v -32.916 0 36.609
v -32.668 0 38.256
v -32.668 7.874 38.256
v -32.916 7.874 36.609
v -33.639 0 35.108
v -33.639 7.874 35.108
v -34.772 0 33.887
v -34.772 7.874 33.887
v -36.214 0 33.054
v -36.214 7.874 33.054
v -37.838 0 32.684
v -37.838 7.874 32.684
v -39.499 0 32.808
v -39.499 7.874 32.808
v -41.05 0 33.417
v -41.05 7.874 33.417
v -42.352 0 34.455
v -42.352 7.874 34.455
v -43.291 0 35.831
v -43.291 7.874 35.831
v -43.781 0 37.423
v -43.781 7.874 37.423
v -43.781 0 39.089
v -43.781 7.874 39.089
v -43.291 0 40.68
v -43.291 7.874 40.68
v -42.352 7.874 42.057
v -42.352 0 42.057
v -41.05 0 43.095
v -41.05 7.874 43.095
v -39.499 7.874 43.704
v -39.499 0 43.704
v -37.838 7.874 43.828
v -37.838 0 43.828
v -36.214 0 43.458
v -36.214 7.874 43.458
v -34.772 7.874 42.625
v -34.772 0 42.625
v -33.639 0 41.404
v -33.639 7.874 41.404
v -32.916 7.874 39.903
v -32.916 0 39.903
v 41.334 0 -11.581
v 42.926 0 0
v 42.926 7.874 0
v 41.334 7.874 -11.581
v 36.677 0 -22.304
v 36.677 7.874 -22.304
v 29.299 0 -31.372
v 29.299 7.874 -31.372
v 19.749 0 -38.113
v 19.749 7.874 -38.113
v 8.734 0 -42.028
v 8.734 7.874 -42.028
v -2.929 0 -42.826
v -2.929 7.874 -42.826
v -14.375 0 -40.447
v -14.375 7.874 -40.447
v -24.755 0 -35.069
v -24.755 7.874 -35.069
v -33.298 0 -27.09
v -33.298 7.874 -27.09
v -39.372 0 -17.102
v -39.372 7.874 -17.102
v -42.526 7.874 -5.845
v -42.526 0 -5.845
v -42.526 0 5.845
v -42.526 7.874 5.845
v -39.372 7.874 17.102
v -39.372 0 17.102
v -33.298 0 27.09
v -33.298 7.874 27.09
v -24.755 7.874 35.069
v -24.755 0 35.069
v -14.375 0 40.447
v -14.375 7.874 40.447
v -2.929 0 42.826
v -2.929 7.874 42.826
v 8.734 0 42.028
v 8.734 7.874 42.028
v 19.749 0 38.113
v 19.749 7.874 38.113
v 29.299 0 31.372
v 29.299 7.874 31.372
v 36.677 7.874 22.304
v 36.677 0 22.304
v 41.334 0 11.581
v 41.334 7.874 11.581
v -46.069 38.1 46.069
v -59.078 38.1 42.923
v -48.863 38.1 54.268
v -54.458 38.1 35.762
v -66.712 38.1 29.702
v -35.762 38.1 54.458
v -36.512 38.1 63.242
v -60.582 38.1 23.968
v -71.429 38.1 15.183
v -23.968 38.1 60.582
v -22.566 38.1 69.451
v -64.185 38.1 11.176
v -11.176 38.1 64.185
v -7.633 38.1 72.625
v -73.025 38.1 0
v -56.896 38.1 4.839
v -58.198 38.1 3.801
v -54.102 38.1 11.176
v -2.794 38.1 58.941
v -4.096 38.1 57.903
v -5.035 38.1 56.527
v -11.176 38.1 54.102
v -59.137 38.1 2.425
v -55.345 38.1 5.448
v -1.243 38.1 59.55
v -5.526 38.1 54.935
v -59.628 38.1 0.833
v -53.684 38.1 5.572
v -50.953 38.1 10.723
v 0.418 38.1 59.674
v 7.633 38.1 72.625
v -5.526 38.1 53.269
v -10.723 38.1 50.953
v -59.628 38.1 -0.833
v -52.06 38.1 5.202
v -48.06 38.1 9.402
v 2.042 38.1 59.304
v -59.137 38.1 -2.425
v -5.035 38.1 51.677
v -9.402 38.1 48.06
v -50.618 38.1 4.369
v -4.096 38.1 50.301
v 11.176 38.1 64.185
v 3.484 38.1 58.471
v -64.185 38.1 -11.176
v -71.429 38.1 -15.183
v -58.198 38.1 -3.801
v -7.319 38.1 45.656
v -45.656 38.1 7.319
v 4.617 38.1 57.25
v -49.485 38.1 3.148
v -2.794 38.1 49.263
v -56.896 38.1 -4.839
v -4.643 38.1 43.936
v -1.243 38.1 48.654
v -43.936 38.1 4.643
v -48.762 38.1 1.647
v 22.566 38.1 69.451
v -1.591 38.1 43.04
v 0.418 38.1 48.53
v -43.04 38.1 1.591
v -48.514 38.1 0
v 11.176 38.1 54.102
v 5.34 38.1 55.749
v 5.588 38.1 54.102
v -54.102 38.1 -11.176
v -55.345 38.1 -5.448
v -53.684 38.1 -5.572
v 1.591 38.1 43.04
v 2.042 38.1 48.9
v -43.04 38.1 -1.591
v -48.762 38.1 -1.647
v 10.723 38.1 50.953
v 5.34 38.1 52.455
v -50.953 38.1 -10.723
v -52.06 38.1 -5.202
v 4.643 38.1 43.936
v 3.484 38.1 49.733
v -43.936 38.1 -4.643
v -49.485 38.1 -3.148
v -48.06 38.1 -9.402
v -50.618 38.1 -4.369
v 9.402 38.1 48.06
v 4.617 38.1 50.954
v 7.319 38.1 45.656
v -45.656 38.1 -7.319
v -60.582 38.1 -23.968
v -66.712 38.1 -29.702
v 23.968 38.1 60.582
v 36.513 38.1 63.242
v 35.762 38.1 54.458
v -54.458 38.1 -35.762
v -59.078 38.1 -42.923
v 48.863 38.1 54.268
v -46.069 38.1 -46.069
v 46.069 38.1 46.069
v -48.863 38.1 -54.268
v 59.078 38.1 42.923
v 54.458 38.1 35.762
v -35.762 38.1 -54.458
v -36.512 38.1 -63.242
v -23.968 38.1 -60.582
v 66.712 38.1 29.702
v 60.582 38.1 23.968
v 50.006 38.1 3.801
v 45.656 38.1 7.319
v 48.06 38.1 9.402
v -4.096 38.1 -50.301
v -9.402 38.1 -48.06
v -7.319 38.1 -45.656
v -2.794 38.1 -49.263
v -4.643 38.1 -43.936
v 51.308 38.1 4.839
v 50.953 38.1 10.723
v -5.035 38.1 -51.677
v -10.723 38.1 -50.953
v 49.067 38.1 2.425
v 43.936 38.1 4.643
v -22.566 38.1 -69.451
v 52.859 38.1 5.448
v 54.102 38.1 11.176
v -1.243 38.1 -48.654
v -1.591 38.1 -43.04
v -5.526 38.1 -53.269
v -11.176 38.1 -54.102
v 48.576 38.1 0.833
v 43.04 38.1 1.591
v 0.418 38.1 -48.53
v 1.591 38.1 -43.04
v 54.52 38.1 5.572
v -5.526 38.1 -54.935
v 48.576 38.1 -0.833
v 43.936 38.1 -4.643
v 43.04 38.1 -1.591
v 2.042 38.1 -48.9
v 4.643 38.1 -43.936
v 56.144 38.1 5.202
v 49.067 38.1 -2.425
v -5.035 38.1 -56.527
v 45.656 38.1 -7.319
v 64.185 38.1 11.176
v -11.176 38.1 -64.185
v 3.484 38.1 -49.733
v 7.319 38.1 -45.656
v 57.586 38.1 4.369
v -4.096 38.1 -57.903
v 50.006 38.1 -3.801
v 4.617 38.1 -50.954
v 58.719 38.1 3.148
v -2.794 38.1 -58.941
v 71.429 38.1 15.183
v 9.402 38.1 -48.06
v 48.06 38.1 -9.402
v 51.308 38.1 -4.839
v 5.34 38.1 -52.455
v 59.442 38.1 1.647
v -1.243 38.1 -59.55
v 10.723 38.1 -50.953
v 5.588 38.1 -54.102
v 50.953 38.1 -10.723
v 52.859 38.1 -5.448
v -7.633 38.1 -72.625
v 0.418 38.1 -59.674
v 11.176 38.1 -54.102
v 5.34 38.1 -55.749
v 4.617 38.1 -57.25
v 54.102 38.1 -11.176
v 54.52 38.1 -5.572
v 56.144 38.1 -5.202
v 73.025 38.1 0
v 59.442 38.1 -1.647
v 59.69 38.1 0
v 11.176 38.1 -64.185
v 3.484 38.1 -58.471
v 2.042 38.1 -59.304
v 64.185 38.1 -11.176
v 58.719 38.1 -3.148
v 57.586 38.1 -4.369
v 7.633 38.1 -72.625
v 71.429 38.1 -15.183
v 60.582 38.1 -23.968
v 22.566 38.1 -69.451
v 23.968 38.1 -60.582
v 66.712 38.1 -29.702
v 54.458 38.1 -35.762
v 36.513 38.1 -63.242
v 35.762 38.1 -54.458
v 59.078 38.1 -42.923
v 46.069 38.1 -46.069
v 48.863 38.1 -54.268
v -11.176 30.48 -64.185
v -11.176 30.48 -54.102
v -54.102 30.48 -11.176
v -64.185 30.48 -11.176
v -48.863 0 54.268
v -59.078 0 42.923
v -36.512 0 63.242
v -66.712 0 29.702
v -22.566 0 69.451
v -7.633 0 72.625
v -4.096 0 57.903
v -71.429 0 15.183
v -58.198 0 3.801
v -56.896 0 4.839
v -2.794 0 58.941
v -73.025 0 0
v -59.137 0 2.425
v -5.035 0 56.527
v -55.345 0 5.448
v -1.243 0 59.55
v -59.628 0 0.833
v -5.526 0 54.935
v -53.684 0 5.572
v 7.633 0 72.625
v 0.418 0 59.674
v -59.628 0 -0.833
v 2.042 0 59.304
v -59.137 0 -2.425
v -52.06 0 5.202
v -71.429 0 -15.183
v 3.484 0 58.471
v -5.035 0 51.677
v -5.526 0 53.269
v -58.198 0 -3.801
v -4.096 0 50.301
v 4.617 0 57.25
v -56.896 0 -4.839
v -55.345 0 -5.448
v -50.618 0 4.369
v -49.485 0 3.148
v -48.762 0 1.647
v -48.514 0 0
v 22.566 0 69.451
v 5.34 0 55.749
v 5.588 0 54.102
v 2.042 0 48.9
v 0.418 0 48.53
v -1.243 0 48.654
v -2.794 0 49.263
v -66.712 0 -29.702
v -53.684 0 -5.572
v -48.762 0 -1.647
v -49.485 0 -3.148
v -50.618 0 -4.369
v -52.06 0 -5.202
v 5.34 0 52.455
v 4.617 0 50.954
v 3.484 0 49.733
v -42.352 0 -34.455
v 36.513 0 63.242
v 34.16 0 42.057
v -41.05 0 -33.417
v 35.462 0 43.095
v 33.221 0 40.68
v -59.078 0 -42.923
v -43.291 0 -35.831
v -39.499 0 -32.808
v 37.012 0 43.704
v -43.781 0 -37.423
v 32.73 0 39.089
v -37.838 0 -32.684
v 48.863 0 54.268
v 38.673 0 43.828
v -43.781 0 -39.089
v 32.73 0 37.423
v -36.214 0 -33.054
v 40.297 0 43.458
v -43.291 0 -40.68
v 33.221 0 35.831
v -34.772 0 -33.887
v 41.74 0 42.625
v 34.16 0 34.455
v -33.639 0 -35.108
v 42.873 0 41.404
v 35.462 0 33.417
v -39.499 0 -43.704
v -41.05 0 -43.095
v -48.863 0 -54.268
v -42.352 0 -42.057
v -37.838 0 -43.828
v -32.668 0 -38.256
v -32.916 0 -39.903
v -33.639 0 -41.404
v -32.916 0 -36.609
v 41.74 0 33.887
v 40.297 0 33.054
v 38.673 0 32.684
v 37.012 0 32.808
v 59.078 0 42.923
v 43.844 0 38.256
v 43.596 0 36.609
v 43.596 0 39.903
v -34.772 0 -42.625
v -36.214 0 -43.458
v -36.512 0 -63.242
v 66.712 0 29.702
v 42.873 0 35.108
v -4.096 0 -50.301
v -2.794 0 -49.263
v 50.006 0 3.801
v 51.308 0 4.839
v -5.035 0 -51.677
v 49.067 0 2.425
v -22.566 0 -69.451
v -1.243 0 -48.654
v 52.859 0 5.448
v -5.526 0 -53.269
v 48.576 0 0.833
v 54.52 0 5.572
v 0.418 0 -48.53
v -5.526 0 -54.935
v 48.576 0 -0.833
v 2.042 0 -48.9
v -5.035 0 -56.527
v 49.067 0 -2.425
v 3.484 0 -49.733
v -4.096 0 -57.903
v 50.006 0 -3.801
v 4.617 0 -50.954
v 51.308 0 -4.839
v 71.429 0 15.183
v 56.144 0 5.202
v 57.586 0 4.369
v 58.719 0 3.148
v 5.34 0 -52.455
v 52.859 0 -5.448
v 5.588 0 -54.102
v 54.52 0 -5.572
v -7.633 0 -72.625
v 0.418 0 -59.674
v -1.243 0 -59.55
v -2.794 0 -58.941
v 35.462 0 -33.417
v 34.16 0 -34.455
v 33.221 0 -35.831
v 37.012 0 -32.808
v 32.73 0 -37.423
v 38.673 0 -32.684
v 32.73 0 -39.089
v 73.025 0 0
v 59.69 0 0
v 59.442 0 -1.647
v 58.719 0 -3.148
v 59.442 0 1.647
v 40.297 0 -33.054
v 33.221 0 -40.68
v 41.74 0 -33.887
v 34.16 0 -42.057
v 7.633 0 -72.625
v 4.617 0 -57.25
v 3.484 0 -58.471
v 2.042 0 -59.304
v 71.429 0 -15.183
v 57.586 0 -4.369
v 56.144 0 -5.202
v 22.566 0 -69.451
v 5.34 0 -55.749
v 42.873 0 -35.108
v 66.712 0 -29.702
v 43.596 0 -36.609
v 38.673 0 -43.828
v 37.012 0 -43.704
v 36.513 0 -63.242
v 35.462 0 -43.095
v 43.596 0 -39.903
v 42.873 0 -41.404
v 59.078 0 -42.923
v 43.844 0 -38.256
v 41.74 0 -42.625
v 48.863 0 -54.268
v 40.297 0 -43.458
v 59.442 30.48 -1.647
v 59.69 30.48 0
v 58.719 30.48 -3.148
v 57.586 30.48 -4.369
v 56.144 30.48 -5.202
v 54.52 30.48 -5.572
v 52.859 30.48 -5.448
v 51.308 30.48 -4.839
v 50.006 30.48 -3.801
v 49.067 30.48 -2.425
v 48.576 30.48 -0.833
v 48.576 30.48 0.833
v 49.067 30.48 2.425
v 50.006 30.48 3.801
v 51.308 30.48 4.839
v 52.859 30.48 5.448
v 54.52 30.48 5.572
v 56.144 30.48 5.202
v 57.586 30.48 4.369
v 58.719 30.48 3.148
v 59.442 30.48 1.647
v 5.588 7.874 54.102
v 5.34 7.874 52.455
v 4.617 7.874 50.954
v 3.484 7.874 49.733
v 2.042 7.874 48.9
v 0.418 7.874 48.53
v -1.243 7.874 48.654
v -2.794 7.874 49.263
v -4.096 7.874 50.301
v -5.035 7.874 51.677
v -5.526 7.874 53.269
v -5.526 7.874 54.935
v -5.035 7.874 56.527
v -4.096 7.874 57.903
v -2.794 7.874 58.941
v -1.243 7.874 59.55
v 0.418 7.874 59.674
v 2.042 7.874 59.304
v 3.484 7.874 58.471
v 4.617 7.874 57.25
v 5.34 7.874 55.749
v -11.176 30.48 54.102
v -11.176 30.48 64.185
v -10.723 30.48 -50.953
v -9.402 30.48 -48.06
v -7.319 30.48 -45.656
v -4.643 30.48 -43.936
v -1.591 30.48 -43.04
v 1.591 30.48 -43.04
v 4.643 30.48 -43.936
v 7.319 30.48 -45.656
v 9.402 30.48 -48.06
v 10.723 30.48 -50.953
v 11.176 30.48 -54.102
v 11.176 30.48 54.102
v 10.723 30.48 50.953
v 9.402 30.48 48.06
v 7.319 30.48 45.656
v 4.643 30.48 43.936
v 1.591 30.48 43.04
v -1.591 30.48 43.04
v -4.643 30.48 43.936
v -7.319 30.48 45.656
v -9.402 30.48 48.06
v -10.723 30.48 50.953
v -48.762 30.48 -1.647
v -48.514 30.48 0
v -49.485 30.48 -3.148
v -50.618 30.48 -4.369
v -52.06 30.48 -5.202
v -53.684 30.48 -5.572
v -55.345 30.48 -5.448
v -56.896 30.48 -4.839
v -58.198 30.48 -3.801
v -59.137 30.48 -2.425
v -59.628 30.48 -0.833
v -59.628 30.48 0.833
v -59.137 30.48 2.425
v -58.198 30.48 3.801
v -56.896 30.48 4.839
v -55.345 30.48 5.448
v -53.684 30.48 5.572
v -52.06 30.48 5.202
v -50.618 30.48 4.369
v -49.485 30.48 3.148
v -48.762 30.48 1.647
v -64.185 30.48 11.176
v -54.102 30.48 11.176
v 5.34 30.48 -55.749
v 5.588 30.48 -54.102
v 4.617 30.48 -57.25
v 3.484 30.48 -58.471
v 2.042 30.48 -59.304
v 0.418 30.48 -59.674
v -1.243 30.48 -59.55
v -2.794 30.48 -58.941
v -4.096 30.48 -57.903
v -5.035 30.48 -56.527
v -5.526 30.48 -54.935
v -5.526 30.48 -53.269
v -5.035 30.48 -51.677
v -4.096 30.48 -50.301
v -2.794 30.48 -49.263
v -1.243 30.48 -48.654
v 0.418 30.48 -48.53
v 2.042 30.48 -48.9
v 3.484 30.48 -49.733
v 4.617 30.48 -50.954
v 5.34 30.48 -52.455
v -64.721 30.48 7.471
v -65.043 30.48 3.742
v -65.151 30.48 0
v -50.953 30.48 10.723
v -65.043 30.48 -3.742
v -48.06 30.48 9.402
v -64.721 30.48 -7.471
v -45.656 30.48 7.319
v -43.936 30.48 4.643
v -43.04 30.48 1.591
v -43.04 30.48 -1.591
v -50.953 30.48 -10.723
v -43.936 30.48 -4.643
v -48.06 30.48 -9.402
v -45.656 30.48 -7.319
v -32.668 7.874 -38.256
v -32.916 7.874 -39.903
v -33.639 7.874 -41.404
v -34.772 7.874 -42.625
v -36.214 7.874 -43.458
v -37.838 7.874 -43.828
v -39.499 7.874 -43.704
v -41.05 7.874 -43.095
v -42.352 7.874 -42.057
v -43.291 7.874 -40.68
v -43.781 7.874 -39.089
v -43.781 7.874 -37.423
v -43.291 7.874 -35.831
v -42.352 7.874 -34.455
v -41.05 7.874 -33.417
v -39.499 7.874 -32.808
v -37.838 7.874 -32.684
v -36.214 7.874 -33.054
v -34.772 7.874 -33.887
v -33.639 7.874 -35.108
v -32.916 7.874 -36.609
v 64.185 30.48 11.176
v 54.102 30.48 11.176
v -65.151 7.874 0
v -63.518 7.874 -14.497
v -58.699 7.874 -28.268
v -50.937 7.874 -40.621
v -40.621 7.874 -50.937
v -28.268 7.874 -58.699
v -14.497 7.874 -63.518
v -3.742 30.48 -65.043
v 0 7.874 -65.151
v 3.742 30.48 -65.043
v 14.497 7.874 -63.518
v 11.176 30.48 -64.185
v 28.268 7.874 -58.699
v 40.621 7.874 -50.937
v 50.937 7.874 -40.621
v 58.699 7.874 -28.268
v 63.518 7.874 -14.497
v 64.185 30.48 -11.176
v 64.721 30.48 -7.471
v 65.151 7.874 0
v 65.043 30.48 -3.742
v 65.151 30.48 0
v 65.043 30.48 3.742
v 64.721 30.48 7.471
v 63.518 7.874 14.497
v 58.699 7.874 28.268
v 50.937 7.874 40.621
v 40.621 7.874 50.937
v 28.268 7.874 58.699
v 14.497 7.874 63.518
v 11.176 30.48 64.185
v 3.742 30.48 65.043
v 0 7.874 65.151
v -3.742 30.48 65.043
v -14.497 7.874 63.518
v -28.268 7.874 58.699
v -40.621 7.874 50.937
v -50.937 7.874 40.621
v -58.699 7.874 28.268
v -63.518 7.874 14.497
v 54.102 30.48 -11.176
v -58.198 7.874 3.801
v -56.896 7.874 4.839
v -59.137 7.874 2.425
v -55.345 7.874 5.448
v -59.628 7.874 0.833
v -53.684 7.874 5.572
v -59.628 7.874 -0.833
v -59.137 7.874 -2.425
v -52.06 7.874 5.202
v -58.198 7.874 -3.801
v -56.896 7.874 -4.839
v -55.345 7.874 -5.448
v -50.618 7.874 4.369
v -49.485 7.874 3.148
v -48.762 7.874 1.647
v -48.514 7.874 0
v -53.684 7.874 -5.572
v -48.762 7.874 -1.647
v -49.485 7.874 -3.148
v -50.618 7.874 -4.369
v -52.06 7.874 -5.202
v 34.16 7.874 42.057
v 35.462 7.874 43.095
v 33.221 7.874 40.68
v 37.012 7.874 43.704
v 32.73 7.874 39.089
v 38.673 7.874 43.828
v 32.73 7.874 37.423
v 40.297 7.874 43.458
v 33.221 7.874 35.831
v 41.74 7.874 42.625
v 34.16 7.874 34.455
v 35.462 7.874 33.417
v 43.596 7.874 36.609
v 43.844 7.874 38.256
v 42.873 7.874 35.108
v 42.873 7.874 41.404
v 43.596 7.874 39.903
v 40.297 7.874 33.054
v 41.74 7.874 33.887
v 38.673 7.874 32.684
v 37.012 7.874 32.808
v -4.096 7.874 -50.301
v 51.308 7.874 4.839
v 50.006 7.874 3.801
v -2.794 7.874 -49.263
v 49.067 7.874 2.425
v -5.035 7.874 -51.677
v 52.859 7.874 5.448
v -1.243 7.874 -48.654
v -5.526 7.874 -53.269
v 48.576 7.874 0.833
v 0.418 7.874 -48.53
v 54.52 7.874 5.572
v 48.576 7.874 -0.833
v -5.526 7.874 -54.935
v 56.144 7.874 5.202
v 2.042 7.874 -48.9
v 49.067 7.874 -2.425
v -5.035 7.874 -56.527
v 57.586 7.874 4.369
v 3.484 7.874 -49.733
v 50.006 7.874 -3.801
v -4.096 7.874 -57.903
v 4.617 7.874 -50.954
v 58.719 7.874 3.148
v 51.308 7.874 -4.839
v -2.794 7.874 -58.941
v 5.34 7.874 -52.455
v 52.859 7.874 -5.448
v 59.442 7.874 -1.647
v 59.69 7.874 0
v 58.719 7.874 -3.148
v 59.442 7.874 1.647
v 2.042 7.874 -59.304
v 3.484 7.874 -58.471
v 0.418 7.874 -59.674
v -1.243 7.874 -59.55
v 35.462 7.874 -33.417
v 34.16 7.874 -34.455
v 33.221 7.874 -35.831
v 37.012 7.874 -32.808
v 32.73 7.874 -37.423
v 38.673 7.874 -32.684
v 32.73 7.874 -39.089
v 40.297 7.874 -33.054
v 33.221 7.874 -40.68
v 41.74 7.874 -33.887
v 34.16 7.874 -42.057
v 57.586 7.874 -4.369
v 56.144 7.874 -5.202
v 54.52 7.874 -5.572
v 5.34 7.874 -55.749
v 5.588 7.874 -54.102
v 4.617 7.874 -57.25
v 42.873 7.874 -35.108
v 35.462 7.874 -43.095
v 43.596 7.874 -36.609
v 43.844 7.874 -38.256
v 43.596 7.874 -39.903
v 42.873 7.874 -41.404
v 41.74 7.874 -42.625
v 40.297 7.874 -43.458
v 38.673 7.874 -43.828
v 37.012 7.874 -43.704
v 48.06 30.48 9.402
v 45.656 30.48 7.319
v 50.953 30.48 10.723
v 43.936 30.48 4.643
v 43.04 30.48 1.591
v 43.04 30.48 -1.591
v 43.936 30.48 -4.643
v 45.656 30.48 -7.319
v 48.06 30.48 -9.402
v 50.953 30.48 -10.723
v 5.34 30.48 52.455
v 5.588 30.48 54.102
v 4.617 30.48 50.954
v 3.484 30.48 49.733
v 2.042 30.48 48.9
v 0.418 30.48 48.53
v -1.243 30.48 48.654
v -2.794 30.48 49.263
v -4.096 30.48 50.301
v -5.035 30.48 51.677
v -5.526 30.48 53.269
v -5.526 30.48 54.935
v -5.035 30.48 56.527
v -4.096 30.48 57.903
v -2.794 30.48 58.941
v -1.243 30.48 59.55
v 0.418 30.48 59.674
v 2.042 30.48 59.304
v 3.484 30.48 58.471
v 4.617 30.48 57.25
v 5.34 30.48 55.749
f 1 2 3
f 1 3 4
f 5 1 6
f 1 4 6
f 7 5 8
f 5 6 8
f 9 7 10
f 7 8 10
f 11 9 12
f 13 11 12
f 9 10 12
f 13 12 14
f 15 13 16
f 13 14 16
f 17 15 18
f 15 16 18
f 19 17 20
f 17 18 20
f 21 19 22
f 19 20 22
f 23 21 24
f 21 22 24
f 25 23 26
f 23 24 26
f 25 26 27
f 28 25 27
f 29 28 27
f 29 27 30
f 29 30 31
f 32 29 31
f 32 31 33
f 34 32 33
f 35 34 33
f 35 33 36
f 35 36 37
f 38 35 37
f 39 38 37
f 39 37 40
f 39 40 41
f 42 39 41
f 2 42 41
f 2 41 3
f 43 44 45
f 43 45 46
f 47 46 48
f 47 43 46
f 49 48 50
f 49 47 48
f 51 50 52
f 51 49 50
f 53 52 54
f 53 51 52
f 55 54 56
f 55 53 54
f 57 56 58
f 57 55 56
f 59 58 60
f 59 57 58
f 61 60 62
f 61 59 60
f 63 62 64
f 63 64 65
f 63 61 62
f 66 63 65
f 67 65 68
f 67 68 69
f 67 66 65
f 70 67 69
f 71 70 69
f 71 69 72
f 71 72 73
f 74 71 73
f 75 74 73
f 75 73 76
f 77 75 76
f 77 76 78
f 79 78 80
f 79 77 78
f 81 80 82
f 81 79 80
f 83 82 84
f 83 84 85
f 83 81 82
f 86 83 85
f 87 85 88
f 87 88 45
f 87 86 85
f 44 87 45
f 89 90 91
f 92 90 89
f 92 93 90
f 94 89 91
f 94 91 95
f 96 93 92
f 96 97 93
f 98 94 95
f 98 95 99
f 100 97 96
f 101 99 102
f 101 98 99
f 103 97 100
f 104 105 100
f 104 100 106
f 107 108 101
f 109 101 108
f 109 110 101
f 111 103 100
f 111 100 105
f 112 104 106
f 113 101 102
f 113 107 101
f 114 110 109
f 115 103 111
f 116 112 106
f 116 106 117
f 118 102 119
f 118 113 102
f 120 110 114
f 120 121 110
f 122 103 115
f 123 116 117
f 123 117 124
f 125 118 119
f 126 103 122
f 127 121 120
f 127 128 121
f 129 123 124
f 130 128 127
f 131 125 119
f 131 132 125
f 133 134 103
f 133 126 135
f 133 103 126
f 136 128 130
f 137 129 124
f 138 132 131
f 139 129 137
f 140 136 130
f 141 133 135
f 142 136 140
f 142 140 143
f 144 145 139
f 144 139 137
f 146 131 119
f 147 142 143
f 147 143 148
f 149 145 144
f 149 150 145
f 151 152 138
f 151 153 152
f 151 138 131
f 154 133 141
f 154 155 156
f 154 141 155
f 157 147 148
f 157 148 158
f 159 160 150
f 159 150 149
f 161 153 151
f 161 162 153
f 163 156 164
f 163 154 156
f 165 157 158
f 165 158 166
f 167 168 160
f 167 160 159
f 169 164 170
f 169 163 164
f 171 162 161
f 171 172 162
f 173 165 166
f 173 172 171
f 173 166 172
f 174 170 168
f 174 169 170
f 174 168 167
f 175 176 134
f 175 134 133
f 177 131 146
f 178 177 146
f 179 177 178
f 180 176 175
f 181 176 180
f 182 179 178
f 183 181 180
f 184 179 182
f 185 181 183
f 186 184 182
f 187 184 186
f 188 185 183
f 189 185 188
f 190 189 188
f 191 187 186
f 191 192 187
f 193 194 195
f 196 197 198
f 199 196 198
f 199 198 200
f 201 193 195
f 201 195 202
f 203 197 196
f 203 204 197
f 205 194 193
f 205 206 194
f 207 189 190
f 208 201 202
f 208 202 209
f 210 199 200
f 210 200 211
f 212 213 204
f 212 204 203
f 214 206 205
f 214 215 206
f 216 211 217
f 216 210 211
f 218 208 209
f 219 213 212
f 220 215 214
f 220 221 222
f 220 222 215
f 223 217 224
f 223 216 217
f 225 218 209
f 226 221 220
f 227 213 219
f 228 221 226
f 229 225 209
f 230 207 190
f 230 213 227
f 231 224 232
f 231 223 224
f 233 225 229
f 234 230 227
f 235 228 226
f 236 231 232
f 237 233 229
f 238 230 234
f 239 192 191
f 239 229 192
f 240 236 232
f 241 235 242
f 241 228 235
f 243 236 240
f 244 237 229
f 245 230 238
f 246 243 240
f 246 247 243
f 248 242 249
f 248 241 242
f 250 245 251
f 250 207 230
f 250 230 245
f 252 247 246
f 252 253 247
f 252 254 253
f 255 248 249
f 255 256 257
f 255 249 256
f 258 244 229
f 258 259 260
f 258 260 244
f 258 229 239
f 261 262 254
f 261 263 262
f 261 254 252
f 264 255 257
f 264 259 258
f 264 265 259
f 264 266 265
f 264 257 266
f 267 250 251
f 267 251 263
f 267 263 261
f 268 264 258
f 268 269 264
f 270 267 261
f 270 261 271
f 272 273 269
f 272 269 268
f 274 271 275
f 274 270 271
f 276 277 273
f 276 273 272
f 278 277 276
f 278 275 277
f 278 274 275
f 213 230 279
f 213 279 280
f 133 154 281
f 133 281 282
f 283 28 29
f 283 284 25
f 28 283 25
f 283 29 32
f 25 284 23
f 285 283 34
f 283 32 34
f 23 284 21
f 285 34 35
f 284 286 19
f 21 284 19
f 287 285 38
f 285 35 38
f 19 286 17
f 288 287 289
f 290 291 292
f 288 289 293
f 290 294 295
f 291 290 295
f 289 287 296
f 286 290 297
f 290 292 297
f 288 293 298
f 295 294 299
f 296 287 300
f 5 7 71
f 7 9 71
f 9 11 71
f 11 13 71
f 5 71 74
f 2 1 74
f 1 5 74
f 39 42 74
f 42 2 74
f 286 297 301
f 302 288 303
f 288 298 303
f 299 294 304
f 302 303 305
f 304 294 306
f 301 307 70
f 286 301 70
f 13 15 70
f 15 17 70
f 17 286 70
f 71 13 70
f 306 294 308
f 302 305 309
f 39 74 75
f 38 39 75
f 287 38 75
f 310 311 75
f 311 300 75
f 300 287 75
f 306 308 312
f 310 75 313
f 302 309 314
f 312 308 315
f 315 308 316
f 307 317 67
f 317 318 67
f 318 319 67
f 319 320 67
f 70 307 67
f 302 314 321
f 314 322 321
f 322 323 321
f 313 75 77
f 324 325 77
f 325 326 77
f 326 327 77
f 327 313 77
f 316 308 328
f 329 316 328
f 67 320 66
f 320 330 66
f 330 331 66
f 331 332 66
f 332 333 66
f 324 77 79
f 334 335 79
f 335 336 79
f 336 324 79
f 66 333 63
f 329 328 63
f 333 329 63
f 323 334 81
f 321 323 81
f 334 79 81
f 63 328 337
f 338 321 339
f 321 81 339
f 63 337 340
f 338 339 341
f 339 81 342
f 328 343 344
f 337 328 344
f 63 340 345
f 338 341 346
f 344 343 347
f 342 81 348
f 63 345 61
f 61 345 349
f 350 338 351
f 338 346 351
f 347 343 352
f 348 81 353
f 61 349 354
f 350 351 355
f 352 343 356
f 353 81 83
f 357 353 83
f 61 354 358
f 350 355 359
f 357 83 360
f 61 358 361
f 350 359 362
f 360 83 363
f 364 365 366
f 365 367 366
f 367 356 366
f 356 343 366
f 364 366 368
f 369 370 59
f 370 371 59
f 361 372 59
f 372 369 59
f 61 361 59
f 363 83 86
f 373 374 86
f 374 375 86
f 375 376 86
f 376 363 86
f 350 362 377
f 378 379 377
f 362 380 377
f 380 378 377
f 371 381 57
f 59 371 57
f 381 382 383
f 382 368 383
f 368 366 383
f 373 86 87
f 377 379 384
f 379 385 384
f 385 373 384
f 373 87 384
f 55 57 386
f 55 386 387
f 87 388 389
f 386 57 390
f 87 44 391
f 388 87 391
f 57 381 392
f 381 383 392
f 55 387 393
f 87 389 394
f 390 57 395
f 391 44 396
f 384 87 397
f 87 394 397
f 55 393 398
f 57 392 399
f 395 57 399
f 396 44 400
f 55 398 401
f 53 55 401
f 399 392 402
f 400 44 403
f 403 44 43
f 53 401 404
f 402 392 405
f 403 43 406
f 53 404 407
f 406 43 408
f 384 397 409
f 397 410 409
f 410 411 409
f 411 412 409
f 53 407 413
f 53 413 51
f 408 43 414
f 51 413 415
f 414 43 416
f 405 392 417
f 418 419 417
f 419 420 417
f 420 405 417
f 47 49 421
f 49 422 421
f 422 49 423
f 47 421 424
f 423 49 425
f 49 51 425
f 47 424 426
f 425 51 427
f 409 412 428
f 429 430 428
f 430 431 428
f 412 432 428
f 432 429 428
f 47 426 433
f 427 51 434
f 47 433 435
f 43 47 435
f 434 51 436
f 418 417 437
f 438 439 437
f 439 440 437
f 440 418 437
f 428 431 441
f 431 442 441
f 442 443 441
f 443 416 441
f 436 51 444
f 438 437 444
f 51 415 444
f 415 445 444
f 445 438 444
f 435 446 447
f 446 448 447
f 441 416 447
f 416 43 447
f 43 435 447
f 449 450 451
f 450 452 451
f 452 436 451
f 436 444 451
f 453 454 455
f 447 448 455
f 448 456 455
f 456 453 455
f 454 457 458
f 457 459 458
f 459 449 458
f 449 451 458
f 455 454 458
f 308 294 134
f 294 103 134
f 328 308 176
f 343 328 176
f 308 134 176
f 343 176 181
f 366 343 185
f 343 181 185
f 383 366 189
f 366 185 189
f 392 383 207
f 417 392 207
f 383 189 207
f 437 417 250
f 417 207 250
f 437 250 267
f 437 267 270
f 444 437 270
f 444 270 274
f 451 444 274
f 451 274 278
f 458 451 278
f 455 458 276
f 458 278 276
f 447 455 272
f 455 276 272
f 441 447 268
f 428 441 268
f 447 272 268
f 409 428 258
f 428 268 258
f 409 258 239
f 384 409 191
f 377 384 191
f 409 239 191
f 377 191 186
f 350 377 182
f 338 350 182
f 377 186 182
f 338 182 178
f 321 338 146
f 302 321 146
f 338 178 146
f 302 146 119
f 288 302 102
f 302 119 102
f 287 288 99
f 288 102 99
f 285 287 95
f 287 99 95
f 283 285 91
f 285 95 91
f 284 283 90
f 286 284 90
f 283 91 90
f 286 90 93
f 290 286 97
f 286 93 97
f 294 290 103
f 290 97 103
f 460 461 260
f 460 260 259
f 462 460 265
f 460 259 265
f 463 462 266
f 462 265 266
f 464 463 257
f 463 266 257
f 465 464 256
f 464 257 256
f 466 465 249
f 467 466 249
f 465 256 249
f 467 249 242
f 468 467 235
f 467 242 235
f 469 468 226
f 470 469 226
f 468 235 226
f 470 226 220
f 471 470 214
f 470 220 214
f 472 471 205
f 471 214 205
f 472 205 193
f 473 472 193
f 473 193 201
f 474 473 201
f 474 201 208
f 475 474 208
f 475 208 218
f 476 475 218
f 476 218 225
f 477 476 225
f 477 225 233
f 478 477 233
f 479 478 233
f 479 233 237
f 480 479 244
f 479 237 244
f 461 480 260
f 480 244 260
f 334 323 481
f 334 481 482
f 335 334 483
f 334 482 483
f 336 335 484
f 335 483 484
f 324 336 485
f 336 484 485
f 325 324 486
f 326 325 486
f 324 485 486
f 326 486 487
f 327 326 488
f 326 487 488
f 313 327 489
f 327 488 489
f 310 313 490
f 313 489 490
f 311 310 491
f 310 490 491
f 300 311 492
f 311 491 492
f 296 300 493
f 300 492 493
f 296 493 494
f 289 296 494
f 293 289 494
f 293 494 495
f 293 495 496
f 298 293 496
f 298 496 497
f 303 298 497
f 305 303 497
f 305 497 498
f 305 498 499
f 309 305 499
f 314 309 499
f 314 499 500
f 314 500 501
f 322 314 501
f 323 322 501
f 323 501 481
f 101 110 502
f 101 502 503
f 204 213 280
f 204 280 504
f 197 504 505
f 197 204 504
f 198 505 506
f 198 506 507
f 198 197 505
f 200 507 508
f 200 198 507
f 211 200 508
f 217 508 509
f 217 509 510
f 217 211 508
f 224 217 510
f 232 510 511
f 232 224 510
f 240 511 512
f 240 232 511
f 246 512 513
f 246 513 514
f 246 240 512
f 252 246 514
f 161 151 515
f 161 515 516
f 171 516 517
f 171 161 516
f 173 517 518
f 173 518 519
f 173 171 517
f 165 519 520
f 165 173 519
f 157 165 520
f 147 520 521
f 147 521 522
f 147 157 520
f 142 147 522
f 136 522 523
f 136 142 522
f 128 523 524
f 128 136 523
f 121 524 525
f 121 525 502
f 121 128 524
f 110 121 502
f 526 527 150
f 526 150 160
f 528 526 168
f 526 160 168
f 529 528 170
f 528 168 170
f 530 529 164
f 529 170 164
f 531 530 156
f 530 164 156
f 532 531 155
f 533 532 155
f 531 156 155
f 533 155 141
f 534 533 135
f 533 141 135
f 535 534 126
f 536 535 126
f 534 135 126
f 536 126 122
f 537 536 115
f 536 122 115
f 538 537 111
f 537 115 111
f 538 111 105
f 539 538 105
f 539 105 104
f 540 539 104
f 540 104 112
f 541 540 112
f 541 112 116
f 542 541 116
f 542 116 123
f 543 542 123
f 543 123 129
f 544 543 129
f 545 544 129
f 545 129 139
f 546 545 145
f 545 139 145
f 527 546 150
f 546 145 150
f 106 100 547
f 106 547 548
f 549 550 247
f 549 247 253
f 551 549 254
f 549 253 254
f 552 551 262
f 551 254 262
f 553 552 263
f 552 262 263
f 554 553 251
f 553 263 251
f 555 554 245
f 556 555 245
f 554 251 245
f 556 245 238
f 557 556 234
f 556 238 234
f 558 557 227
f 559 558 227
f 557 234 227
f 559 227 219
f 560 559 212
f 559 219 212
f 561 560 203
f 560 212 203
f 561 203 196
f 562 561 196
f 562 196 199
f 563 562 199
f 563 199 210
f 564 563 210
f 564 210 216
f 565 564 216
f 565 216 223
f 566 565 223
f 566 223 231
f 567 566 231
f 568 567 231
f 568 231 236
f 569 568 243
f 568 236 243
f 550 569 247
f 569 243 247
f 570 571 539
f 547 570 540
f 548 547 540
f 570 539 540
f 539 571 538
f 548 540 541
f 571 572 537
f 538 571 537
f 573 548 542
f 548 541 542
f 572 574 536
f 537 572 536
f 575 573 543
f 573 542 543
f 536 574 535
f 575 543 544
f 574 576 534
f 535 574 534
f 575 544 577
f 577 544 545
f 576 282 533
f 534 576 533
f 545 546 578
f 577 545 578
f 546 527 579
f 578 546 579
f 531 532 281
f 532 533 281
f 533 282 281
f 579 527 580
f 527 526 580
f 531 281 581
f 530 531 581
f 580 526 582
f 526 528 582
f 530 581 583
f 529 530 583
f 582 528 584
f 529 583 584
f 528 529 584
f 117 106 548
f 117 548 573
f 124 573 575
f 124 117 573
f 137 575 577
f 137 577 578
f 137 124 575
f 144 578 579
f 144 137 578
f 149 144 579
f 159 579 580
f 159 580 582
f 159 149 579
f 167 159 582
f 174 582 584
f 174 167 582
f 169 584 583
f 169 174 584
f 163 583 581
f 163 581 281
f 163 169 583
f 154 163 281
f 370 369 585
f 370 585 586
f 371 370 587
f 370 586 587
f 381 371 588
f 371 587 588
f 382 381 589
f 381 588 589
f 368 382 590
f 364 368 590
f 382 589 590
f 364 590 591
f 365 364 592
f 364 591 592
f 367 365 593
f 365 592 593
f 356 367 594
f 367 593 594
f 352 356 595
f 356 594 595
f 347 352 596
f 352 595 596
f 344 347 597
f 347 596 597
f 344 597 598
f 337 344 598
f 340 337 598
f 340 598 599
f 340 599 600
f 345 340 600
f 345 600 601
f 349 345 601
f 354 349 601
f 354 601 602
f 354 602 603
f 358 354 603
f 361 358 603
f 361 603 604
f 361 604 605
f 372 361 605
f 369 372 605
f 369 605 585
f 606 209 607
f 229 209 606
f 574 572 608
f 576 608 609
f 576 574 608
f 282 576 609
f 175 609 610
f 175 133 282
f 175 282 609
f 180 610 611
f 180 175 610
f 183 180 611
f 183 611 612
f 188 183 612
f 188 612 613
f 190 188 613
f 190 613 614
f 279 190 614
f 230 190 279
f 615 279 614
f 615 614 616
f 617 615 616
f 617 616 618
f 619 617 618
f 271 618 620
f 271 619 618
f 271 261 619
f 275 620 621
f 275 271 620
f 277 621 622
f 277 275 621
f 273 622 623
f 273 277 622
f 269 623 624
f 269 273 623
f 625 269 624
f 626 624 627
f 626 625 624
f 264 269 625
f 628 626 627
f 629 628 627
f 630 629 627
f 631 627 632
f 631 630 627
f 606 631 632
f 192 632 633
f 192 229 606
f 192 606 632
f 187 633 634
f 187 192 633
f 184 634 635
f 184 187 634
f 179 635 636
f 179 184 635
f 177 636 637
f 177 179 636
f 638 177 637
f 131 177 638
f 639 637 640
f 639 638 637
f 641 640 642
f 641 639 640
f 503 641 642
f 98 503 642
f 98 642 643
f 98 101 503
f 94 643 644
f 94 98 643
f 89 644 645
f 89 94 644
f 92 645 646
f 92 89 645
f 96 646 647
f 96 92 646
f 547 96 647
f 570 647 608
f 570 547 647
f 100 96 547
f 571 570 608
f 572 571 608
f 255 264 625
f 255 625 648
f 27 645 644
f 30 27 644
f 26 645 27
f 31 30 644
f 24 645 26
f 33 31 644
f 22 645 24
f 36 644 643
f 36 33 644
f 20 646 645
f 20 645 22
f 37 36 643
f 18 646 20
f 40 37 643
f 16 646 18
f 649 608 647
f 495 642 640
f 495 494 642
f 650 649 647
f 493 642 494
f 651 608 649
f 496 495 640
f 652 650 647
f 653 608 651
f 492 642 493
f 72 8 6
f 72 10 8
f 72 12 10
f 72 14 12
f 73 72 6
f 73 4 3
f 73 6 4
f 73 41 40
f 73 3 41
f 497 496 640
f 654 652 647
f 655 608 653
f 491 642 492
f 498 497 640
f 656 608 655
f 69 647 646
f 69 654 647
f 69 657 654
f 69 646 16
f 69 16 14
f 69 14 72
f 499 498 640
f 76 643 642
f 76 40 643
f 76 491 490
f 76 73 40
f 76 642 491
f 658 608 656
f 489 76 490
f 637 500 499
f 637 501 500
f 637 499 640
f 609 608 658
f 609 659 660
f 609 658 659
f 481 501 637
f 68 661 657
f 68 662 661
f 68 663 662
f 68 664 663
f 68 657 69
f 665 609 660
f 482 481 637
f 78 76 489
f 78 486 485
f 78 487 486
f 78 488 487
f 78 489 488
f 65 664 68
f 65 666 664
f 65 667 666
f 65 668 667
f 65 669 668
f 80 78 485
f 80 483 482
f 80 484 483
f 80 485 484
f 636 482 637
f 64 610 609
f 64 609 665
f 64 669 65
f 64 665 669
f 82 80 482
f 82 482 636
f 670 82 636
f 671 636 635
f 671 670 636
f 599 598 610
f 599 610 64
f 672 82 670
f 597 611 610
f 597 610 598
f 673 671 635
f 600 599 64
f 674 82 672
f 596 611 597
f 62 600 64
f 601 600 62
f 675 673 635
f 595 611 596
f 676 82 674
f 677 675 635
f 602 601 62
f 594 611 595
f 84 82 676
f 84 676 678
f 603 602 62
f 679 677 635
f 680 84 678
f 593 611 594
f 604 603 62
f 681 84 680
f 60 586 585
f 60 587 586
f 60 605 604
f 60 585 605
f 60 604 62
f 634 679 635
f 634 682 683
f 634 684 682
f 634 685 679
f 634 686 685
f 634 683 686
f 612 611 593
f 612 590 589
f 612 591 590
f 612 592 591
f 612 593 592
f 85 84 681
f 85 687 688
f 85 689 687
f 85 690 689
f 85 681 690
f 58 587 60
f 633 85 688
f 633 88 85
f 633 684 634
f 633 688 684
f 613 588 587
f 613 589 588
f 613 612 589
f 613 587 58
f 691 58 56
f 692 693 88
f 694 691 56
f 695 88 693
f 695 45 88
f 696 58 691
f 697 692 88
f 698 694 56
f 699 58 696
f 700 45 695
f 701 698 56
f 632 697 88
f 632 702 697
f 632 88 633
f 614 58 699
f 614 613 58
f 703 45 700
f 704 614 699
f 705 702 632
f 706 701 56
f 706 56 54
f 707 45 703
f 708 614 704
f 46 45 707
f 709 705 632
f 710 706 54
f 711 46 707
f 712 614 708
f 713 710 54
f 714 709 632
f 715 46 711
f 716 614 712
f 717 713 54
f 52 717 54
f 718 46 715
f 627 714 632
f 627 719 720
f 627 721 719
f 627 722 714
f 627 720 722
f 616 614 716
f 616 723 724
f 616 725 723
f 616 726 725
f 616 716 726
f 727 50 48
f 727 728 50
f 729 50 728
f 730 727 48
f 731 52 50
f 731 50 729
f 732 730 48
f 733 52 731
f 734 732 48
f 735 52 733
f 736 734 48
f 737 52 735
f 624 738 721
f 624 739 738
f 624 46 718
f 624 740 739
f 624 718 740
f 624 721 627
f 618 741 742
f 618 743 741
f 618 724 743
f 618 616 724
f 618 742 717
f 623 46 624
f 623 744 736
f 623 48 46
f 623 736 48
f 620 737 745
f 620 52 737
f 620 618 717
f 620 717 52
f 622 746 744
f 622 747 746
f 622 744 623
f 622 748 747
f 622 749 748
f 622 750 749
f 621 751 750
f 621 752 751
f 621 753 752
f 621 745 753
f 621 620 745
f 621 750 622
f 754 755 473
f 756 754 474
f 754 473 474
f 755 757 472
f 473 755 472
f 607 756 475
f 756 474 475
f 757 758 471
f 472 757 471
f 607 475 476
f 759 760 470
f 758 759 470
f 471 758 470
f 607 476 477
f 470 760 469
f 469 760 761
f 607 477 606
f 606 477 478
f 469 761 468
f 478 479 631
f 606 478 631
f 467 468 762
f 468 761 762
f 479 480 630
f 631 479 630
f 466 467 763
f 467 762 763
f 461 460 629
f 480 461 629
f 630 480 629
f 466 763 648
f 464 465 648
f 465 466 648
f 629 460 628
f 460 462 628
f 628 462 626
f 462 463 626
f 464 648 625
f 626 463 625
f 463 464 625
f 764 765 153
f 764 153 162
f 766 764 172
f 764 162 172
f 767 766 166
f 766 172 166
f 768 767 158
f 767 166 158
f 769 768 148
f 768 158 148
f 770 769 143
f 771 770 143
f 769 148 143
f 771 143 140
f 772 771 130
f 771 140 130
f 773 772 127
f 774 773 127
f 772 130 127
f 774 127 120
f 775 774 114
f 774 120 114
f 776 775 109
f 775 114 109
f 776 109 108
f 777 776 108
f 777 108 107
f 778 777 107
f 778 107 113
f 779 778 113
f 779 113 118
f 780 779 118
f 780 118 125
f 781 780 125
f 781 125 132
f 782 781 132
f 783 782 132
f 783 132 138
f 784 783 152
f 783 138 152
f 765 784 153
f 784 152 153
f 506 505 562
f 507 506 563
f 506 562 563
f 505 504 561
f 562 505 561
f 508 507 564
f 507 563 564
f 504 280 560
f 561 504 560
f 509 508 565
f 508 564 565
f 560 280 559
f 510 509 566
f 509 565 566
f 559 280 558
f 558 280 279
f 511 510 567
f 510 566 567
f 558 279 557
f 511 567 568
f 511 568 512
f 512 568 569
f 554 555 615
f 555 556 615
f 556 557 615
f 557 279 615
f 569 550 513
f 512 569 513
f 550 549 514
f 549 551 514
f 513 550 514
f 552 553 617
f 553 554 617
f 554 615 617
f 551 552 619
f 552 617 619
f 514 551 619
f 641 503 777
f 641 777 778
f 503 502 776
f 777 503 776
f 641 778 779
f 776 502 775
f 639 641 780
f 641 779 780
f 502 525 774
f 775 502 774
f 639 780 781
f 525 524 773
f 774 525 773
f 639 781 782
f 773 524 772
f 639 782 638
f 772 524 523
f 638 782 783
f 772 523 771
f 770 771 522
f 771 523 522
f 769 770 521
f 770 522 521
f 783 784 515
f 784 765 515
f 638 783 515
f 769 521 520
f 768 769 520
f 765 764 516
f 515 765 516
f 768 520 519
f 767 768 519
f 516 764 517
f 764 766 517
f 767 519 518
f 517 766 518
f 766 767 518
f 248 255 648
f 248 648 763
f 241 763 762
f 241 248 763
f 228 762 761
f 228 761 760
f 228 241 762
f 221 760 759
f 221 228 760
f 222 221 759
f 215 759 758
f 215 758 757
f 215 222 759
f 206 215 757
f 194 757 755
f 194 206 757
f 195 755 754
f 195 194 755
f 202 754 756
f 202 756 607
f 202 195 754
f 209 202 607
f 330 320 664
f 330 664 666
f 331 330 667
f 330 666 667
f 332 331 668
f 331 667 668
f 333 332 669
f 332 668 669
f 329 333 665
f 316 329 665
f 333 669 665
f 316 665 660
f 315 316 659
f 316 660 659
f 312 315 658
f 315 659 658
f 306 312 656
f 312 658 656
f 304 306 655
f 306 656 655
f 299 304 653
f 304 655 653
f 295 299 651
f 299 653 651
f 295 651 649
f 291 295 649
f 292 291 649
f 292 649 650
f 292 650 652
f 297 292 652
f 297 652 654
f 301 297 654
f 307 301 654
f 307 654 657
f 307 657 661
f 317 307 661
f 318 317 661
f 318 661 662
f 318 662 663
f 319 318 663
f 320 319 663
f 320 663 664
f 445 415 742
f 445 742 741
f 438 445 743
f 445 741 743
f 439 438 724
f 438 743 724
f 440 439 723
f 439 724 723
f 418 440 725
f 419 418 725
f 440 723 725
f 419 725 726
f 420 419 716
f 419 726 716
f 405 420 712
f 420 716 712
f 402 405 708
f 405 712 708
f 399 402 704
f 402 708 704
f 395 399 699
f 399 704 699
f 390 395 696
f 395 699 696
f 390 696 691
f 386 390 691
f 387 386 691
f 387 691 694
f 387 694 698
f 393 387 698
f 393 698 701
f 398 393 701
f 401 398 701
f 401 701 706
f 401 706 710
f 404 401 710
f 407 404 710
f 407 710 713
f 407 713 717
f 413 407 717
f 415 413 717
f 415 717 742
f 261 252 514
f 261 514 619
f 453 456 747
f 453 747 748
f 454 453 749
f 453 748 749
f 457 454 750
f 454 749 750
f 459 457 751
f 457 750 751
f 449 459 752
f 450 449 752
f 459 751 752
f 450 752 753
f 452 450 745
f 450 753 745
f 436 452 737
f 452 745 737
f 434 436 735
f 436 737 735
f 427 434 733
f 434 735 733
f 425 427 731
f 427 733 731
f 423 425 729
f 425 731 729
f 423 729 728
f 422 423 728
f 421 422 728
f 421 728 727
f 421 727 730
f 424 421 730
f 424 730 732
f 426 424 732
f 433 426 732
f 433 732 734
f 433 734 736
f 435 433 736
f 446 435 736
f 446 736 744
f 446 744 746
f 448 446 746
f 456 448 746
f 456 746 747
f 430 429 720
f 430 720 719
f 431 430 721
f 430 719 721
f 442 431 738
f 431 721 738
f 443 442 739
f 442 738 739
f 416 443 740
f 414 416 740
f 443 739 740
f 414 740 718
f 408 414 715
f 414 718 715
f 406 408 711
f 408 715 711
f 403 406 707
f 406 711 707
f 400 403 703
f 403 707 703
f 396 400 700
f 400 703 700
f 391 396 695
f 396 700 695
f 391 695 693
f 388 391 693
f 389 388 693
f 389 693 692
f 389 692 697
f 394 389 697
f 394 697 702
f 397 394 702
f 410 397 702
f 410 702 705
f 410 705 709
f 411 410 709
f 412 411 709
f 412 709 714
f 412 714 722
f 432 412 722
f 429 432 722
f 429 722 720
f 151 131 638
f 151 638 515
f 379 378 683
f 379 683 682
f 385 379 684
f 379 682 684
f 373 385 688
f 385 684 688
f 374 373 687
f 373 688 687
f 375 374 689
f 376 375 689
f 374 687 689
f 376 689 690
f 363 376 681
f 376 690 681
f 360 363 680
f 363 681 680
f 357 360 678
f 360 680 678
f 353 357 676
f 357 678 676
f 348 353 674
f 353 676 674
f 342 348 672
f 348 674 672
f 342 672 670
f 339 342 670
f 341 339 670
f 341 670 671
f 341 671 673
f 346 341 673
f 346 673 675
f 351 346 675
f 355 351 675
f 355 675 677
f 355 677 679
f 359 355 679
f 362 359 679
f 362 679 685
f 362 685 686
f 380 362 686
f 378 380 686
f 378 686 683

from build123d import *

# Parameters (mm, degrees)
SKETCH1_W           = 7.874
SKETCH1_H           = 38.1
SKETCH2_R           = 65.151
SKETCH2_R_2         = 42.926
BOSS_EXTRUDE2_DEPTH = 7.874
SKETCH4_R           = 5.588
CUT_EXTRUDE1_DEPTH  = 8.874
SKETCH5_R           = 5.588
BOSS_EXTRUDE4_DEPTH = 7.62


with BuildPart() as part:
    # Sketch1 → Revolve1 (revolve)
    with BuildSketch(Plane.XY):
        with Locations((-69.088, 19.05)):
            Rectangle(SKETCH1_W, SKETCH1_H)
    revolve(axis=Axis((0, 92.899450936, 0), (0, -1, 0)))

    # Sketch2 → Boss-Extrude2 (add)
    with BuildSketch(Plane(origin=(0, 0, 0), x_dir=(1, 0, 0), z_dir=(0, 1, 0))):
        Circle(SKETCH2_R)
        Circle(SKETCH2_R_2, mode=Mode.SUBTRACT)
    extrude(amount=BOSS_EXTRUDE2_DEPTH)

    # Sketch4 → Cut-Extrude1 (cut, through all)
    with BuildSketch(Plane(origin=(0, 7.874, 0), x_dir=(1, 0, 0), z_dir=(0, 1, 0))):
        with Locations((0, 54.102)):
            Circle(SKETCH4_R)
        with Locations((38.255891076, 38.255891076)):
            Circle(SKETCH4_R)
        with Locations((54.102, 0)):
            Circle(SKETCH4_R)
        with Locations((38.255891076, -38.255891076)):
            Circle(SKETCH4_R)
        with Locations((0, -54.102)):
            Circle(SKETCH4_R)
        with Locations((-38.255891076, -38.255891076)):
            Circle(SKETCH4_R)
        with Locations((-54.102, 0)):
            Circle(SKETCH4_R)
        with Locations((-38.255891076, 38.255891076)):
            Circle(SKETCH4_R)
    extrude(amount=-CUT_EXTRUDE1_DEPTH, mode=Mode.SUBTRACT)

    # Sketch5 → Boss-Extrude4 (add)
    with BuildSketch(Plane(origin=(0, 38.1, 0), x_dir=(1, 0, 0), z_dir=(0, 1, 0))):
        with BuildLine():
            Line((-54.102, 11.176), (-64.185277323, 11.176))
            ThreePointArc((-64.185277323, 11.176), (-65.151, 0), (-64.185277323, -11.176))
            Line((-64.185277323, -11.176), (-54.102, -11.176))
            ThreePointArc((-54.102, -11.176), (-42.926, 0), (-54.102, 11.176))
        make_face()
        with Locations((-54.102, 0)):
            Circle(SKETCH5_R, mode=Mode.SUBTRACT)
        with BuildLine():
            Line((11.176, 54.102), (11.176, 64.185277323))
            ThreePointArc((11.176, 64.185277323), (0, 65.151), (-11.176, 64.185277323))
            Line((-11.176, 64.185277323), (-11.176, 54.102))
            ThreePointArc((-11.176, 54.102), (0, 42.926), (11.176, 54.102))
        make_face()
        with Locations((0, 54.102)):
            Circle(SKETCH5_R, mode=Mode.SUBTRACT)
        with BuildLine():
            ThreePointArc((65.151, 0), (64.909120329, 5.608823323), (64.185277323, 11.176))
            Line((64.185277323, 11.176), (54.102, 11.176))
            ThreePointArc((54.102, 11.176), (42.926, 0), (54.102, -11.176))
            Line((54.102, -11.176), (64.185277323, -11.176))
            ThreePointArc((64.185277323, -11.176), (64.909120329, -5.608823323), (65.151, 0))
        make_face()
        with Locations((54.102, 0)):
            Circle(SKETCH5_R, mode=Mode.SUBTRACT)
        with BuildLine():
            ThreePointArc((-11.176, -64.185277323), (0, -65.151), (11.176, -64.185277323))
            Line((11.176, -64.185277323), (11.176, -54.102))
            ThreePointArc((11.176, -54.102), (0, -42.926), (-11.176, -54.102))
            Line((-11.176, -54.102), (-11.176, -64.185277323))
        make_face()
        with Locations((0, -54.102)):
            Circle(SKETCH5_R, mode=Mode.SUBTRACT)
    extrude(amount=-BOSS_EXTRUDE4_DEPTH)


solid = part.part
